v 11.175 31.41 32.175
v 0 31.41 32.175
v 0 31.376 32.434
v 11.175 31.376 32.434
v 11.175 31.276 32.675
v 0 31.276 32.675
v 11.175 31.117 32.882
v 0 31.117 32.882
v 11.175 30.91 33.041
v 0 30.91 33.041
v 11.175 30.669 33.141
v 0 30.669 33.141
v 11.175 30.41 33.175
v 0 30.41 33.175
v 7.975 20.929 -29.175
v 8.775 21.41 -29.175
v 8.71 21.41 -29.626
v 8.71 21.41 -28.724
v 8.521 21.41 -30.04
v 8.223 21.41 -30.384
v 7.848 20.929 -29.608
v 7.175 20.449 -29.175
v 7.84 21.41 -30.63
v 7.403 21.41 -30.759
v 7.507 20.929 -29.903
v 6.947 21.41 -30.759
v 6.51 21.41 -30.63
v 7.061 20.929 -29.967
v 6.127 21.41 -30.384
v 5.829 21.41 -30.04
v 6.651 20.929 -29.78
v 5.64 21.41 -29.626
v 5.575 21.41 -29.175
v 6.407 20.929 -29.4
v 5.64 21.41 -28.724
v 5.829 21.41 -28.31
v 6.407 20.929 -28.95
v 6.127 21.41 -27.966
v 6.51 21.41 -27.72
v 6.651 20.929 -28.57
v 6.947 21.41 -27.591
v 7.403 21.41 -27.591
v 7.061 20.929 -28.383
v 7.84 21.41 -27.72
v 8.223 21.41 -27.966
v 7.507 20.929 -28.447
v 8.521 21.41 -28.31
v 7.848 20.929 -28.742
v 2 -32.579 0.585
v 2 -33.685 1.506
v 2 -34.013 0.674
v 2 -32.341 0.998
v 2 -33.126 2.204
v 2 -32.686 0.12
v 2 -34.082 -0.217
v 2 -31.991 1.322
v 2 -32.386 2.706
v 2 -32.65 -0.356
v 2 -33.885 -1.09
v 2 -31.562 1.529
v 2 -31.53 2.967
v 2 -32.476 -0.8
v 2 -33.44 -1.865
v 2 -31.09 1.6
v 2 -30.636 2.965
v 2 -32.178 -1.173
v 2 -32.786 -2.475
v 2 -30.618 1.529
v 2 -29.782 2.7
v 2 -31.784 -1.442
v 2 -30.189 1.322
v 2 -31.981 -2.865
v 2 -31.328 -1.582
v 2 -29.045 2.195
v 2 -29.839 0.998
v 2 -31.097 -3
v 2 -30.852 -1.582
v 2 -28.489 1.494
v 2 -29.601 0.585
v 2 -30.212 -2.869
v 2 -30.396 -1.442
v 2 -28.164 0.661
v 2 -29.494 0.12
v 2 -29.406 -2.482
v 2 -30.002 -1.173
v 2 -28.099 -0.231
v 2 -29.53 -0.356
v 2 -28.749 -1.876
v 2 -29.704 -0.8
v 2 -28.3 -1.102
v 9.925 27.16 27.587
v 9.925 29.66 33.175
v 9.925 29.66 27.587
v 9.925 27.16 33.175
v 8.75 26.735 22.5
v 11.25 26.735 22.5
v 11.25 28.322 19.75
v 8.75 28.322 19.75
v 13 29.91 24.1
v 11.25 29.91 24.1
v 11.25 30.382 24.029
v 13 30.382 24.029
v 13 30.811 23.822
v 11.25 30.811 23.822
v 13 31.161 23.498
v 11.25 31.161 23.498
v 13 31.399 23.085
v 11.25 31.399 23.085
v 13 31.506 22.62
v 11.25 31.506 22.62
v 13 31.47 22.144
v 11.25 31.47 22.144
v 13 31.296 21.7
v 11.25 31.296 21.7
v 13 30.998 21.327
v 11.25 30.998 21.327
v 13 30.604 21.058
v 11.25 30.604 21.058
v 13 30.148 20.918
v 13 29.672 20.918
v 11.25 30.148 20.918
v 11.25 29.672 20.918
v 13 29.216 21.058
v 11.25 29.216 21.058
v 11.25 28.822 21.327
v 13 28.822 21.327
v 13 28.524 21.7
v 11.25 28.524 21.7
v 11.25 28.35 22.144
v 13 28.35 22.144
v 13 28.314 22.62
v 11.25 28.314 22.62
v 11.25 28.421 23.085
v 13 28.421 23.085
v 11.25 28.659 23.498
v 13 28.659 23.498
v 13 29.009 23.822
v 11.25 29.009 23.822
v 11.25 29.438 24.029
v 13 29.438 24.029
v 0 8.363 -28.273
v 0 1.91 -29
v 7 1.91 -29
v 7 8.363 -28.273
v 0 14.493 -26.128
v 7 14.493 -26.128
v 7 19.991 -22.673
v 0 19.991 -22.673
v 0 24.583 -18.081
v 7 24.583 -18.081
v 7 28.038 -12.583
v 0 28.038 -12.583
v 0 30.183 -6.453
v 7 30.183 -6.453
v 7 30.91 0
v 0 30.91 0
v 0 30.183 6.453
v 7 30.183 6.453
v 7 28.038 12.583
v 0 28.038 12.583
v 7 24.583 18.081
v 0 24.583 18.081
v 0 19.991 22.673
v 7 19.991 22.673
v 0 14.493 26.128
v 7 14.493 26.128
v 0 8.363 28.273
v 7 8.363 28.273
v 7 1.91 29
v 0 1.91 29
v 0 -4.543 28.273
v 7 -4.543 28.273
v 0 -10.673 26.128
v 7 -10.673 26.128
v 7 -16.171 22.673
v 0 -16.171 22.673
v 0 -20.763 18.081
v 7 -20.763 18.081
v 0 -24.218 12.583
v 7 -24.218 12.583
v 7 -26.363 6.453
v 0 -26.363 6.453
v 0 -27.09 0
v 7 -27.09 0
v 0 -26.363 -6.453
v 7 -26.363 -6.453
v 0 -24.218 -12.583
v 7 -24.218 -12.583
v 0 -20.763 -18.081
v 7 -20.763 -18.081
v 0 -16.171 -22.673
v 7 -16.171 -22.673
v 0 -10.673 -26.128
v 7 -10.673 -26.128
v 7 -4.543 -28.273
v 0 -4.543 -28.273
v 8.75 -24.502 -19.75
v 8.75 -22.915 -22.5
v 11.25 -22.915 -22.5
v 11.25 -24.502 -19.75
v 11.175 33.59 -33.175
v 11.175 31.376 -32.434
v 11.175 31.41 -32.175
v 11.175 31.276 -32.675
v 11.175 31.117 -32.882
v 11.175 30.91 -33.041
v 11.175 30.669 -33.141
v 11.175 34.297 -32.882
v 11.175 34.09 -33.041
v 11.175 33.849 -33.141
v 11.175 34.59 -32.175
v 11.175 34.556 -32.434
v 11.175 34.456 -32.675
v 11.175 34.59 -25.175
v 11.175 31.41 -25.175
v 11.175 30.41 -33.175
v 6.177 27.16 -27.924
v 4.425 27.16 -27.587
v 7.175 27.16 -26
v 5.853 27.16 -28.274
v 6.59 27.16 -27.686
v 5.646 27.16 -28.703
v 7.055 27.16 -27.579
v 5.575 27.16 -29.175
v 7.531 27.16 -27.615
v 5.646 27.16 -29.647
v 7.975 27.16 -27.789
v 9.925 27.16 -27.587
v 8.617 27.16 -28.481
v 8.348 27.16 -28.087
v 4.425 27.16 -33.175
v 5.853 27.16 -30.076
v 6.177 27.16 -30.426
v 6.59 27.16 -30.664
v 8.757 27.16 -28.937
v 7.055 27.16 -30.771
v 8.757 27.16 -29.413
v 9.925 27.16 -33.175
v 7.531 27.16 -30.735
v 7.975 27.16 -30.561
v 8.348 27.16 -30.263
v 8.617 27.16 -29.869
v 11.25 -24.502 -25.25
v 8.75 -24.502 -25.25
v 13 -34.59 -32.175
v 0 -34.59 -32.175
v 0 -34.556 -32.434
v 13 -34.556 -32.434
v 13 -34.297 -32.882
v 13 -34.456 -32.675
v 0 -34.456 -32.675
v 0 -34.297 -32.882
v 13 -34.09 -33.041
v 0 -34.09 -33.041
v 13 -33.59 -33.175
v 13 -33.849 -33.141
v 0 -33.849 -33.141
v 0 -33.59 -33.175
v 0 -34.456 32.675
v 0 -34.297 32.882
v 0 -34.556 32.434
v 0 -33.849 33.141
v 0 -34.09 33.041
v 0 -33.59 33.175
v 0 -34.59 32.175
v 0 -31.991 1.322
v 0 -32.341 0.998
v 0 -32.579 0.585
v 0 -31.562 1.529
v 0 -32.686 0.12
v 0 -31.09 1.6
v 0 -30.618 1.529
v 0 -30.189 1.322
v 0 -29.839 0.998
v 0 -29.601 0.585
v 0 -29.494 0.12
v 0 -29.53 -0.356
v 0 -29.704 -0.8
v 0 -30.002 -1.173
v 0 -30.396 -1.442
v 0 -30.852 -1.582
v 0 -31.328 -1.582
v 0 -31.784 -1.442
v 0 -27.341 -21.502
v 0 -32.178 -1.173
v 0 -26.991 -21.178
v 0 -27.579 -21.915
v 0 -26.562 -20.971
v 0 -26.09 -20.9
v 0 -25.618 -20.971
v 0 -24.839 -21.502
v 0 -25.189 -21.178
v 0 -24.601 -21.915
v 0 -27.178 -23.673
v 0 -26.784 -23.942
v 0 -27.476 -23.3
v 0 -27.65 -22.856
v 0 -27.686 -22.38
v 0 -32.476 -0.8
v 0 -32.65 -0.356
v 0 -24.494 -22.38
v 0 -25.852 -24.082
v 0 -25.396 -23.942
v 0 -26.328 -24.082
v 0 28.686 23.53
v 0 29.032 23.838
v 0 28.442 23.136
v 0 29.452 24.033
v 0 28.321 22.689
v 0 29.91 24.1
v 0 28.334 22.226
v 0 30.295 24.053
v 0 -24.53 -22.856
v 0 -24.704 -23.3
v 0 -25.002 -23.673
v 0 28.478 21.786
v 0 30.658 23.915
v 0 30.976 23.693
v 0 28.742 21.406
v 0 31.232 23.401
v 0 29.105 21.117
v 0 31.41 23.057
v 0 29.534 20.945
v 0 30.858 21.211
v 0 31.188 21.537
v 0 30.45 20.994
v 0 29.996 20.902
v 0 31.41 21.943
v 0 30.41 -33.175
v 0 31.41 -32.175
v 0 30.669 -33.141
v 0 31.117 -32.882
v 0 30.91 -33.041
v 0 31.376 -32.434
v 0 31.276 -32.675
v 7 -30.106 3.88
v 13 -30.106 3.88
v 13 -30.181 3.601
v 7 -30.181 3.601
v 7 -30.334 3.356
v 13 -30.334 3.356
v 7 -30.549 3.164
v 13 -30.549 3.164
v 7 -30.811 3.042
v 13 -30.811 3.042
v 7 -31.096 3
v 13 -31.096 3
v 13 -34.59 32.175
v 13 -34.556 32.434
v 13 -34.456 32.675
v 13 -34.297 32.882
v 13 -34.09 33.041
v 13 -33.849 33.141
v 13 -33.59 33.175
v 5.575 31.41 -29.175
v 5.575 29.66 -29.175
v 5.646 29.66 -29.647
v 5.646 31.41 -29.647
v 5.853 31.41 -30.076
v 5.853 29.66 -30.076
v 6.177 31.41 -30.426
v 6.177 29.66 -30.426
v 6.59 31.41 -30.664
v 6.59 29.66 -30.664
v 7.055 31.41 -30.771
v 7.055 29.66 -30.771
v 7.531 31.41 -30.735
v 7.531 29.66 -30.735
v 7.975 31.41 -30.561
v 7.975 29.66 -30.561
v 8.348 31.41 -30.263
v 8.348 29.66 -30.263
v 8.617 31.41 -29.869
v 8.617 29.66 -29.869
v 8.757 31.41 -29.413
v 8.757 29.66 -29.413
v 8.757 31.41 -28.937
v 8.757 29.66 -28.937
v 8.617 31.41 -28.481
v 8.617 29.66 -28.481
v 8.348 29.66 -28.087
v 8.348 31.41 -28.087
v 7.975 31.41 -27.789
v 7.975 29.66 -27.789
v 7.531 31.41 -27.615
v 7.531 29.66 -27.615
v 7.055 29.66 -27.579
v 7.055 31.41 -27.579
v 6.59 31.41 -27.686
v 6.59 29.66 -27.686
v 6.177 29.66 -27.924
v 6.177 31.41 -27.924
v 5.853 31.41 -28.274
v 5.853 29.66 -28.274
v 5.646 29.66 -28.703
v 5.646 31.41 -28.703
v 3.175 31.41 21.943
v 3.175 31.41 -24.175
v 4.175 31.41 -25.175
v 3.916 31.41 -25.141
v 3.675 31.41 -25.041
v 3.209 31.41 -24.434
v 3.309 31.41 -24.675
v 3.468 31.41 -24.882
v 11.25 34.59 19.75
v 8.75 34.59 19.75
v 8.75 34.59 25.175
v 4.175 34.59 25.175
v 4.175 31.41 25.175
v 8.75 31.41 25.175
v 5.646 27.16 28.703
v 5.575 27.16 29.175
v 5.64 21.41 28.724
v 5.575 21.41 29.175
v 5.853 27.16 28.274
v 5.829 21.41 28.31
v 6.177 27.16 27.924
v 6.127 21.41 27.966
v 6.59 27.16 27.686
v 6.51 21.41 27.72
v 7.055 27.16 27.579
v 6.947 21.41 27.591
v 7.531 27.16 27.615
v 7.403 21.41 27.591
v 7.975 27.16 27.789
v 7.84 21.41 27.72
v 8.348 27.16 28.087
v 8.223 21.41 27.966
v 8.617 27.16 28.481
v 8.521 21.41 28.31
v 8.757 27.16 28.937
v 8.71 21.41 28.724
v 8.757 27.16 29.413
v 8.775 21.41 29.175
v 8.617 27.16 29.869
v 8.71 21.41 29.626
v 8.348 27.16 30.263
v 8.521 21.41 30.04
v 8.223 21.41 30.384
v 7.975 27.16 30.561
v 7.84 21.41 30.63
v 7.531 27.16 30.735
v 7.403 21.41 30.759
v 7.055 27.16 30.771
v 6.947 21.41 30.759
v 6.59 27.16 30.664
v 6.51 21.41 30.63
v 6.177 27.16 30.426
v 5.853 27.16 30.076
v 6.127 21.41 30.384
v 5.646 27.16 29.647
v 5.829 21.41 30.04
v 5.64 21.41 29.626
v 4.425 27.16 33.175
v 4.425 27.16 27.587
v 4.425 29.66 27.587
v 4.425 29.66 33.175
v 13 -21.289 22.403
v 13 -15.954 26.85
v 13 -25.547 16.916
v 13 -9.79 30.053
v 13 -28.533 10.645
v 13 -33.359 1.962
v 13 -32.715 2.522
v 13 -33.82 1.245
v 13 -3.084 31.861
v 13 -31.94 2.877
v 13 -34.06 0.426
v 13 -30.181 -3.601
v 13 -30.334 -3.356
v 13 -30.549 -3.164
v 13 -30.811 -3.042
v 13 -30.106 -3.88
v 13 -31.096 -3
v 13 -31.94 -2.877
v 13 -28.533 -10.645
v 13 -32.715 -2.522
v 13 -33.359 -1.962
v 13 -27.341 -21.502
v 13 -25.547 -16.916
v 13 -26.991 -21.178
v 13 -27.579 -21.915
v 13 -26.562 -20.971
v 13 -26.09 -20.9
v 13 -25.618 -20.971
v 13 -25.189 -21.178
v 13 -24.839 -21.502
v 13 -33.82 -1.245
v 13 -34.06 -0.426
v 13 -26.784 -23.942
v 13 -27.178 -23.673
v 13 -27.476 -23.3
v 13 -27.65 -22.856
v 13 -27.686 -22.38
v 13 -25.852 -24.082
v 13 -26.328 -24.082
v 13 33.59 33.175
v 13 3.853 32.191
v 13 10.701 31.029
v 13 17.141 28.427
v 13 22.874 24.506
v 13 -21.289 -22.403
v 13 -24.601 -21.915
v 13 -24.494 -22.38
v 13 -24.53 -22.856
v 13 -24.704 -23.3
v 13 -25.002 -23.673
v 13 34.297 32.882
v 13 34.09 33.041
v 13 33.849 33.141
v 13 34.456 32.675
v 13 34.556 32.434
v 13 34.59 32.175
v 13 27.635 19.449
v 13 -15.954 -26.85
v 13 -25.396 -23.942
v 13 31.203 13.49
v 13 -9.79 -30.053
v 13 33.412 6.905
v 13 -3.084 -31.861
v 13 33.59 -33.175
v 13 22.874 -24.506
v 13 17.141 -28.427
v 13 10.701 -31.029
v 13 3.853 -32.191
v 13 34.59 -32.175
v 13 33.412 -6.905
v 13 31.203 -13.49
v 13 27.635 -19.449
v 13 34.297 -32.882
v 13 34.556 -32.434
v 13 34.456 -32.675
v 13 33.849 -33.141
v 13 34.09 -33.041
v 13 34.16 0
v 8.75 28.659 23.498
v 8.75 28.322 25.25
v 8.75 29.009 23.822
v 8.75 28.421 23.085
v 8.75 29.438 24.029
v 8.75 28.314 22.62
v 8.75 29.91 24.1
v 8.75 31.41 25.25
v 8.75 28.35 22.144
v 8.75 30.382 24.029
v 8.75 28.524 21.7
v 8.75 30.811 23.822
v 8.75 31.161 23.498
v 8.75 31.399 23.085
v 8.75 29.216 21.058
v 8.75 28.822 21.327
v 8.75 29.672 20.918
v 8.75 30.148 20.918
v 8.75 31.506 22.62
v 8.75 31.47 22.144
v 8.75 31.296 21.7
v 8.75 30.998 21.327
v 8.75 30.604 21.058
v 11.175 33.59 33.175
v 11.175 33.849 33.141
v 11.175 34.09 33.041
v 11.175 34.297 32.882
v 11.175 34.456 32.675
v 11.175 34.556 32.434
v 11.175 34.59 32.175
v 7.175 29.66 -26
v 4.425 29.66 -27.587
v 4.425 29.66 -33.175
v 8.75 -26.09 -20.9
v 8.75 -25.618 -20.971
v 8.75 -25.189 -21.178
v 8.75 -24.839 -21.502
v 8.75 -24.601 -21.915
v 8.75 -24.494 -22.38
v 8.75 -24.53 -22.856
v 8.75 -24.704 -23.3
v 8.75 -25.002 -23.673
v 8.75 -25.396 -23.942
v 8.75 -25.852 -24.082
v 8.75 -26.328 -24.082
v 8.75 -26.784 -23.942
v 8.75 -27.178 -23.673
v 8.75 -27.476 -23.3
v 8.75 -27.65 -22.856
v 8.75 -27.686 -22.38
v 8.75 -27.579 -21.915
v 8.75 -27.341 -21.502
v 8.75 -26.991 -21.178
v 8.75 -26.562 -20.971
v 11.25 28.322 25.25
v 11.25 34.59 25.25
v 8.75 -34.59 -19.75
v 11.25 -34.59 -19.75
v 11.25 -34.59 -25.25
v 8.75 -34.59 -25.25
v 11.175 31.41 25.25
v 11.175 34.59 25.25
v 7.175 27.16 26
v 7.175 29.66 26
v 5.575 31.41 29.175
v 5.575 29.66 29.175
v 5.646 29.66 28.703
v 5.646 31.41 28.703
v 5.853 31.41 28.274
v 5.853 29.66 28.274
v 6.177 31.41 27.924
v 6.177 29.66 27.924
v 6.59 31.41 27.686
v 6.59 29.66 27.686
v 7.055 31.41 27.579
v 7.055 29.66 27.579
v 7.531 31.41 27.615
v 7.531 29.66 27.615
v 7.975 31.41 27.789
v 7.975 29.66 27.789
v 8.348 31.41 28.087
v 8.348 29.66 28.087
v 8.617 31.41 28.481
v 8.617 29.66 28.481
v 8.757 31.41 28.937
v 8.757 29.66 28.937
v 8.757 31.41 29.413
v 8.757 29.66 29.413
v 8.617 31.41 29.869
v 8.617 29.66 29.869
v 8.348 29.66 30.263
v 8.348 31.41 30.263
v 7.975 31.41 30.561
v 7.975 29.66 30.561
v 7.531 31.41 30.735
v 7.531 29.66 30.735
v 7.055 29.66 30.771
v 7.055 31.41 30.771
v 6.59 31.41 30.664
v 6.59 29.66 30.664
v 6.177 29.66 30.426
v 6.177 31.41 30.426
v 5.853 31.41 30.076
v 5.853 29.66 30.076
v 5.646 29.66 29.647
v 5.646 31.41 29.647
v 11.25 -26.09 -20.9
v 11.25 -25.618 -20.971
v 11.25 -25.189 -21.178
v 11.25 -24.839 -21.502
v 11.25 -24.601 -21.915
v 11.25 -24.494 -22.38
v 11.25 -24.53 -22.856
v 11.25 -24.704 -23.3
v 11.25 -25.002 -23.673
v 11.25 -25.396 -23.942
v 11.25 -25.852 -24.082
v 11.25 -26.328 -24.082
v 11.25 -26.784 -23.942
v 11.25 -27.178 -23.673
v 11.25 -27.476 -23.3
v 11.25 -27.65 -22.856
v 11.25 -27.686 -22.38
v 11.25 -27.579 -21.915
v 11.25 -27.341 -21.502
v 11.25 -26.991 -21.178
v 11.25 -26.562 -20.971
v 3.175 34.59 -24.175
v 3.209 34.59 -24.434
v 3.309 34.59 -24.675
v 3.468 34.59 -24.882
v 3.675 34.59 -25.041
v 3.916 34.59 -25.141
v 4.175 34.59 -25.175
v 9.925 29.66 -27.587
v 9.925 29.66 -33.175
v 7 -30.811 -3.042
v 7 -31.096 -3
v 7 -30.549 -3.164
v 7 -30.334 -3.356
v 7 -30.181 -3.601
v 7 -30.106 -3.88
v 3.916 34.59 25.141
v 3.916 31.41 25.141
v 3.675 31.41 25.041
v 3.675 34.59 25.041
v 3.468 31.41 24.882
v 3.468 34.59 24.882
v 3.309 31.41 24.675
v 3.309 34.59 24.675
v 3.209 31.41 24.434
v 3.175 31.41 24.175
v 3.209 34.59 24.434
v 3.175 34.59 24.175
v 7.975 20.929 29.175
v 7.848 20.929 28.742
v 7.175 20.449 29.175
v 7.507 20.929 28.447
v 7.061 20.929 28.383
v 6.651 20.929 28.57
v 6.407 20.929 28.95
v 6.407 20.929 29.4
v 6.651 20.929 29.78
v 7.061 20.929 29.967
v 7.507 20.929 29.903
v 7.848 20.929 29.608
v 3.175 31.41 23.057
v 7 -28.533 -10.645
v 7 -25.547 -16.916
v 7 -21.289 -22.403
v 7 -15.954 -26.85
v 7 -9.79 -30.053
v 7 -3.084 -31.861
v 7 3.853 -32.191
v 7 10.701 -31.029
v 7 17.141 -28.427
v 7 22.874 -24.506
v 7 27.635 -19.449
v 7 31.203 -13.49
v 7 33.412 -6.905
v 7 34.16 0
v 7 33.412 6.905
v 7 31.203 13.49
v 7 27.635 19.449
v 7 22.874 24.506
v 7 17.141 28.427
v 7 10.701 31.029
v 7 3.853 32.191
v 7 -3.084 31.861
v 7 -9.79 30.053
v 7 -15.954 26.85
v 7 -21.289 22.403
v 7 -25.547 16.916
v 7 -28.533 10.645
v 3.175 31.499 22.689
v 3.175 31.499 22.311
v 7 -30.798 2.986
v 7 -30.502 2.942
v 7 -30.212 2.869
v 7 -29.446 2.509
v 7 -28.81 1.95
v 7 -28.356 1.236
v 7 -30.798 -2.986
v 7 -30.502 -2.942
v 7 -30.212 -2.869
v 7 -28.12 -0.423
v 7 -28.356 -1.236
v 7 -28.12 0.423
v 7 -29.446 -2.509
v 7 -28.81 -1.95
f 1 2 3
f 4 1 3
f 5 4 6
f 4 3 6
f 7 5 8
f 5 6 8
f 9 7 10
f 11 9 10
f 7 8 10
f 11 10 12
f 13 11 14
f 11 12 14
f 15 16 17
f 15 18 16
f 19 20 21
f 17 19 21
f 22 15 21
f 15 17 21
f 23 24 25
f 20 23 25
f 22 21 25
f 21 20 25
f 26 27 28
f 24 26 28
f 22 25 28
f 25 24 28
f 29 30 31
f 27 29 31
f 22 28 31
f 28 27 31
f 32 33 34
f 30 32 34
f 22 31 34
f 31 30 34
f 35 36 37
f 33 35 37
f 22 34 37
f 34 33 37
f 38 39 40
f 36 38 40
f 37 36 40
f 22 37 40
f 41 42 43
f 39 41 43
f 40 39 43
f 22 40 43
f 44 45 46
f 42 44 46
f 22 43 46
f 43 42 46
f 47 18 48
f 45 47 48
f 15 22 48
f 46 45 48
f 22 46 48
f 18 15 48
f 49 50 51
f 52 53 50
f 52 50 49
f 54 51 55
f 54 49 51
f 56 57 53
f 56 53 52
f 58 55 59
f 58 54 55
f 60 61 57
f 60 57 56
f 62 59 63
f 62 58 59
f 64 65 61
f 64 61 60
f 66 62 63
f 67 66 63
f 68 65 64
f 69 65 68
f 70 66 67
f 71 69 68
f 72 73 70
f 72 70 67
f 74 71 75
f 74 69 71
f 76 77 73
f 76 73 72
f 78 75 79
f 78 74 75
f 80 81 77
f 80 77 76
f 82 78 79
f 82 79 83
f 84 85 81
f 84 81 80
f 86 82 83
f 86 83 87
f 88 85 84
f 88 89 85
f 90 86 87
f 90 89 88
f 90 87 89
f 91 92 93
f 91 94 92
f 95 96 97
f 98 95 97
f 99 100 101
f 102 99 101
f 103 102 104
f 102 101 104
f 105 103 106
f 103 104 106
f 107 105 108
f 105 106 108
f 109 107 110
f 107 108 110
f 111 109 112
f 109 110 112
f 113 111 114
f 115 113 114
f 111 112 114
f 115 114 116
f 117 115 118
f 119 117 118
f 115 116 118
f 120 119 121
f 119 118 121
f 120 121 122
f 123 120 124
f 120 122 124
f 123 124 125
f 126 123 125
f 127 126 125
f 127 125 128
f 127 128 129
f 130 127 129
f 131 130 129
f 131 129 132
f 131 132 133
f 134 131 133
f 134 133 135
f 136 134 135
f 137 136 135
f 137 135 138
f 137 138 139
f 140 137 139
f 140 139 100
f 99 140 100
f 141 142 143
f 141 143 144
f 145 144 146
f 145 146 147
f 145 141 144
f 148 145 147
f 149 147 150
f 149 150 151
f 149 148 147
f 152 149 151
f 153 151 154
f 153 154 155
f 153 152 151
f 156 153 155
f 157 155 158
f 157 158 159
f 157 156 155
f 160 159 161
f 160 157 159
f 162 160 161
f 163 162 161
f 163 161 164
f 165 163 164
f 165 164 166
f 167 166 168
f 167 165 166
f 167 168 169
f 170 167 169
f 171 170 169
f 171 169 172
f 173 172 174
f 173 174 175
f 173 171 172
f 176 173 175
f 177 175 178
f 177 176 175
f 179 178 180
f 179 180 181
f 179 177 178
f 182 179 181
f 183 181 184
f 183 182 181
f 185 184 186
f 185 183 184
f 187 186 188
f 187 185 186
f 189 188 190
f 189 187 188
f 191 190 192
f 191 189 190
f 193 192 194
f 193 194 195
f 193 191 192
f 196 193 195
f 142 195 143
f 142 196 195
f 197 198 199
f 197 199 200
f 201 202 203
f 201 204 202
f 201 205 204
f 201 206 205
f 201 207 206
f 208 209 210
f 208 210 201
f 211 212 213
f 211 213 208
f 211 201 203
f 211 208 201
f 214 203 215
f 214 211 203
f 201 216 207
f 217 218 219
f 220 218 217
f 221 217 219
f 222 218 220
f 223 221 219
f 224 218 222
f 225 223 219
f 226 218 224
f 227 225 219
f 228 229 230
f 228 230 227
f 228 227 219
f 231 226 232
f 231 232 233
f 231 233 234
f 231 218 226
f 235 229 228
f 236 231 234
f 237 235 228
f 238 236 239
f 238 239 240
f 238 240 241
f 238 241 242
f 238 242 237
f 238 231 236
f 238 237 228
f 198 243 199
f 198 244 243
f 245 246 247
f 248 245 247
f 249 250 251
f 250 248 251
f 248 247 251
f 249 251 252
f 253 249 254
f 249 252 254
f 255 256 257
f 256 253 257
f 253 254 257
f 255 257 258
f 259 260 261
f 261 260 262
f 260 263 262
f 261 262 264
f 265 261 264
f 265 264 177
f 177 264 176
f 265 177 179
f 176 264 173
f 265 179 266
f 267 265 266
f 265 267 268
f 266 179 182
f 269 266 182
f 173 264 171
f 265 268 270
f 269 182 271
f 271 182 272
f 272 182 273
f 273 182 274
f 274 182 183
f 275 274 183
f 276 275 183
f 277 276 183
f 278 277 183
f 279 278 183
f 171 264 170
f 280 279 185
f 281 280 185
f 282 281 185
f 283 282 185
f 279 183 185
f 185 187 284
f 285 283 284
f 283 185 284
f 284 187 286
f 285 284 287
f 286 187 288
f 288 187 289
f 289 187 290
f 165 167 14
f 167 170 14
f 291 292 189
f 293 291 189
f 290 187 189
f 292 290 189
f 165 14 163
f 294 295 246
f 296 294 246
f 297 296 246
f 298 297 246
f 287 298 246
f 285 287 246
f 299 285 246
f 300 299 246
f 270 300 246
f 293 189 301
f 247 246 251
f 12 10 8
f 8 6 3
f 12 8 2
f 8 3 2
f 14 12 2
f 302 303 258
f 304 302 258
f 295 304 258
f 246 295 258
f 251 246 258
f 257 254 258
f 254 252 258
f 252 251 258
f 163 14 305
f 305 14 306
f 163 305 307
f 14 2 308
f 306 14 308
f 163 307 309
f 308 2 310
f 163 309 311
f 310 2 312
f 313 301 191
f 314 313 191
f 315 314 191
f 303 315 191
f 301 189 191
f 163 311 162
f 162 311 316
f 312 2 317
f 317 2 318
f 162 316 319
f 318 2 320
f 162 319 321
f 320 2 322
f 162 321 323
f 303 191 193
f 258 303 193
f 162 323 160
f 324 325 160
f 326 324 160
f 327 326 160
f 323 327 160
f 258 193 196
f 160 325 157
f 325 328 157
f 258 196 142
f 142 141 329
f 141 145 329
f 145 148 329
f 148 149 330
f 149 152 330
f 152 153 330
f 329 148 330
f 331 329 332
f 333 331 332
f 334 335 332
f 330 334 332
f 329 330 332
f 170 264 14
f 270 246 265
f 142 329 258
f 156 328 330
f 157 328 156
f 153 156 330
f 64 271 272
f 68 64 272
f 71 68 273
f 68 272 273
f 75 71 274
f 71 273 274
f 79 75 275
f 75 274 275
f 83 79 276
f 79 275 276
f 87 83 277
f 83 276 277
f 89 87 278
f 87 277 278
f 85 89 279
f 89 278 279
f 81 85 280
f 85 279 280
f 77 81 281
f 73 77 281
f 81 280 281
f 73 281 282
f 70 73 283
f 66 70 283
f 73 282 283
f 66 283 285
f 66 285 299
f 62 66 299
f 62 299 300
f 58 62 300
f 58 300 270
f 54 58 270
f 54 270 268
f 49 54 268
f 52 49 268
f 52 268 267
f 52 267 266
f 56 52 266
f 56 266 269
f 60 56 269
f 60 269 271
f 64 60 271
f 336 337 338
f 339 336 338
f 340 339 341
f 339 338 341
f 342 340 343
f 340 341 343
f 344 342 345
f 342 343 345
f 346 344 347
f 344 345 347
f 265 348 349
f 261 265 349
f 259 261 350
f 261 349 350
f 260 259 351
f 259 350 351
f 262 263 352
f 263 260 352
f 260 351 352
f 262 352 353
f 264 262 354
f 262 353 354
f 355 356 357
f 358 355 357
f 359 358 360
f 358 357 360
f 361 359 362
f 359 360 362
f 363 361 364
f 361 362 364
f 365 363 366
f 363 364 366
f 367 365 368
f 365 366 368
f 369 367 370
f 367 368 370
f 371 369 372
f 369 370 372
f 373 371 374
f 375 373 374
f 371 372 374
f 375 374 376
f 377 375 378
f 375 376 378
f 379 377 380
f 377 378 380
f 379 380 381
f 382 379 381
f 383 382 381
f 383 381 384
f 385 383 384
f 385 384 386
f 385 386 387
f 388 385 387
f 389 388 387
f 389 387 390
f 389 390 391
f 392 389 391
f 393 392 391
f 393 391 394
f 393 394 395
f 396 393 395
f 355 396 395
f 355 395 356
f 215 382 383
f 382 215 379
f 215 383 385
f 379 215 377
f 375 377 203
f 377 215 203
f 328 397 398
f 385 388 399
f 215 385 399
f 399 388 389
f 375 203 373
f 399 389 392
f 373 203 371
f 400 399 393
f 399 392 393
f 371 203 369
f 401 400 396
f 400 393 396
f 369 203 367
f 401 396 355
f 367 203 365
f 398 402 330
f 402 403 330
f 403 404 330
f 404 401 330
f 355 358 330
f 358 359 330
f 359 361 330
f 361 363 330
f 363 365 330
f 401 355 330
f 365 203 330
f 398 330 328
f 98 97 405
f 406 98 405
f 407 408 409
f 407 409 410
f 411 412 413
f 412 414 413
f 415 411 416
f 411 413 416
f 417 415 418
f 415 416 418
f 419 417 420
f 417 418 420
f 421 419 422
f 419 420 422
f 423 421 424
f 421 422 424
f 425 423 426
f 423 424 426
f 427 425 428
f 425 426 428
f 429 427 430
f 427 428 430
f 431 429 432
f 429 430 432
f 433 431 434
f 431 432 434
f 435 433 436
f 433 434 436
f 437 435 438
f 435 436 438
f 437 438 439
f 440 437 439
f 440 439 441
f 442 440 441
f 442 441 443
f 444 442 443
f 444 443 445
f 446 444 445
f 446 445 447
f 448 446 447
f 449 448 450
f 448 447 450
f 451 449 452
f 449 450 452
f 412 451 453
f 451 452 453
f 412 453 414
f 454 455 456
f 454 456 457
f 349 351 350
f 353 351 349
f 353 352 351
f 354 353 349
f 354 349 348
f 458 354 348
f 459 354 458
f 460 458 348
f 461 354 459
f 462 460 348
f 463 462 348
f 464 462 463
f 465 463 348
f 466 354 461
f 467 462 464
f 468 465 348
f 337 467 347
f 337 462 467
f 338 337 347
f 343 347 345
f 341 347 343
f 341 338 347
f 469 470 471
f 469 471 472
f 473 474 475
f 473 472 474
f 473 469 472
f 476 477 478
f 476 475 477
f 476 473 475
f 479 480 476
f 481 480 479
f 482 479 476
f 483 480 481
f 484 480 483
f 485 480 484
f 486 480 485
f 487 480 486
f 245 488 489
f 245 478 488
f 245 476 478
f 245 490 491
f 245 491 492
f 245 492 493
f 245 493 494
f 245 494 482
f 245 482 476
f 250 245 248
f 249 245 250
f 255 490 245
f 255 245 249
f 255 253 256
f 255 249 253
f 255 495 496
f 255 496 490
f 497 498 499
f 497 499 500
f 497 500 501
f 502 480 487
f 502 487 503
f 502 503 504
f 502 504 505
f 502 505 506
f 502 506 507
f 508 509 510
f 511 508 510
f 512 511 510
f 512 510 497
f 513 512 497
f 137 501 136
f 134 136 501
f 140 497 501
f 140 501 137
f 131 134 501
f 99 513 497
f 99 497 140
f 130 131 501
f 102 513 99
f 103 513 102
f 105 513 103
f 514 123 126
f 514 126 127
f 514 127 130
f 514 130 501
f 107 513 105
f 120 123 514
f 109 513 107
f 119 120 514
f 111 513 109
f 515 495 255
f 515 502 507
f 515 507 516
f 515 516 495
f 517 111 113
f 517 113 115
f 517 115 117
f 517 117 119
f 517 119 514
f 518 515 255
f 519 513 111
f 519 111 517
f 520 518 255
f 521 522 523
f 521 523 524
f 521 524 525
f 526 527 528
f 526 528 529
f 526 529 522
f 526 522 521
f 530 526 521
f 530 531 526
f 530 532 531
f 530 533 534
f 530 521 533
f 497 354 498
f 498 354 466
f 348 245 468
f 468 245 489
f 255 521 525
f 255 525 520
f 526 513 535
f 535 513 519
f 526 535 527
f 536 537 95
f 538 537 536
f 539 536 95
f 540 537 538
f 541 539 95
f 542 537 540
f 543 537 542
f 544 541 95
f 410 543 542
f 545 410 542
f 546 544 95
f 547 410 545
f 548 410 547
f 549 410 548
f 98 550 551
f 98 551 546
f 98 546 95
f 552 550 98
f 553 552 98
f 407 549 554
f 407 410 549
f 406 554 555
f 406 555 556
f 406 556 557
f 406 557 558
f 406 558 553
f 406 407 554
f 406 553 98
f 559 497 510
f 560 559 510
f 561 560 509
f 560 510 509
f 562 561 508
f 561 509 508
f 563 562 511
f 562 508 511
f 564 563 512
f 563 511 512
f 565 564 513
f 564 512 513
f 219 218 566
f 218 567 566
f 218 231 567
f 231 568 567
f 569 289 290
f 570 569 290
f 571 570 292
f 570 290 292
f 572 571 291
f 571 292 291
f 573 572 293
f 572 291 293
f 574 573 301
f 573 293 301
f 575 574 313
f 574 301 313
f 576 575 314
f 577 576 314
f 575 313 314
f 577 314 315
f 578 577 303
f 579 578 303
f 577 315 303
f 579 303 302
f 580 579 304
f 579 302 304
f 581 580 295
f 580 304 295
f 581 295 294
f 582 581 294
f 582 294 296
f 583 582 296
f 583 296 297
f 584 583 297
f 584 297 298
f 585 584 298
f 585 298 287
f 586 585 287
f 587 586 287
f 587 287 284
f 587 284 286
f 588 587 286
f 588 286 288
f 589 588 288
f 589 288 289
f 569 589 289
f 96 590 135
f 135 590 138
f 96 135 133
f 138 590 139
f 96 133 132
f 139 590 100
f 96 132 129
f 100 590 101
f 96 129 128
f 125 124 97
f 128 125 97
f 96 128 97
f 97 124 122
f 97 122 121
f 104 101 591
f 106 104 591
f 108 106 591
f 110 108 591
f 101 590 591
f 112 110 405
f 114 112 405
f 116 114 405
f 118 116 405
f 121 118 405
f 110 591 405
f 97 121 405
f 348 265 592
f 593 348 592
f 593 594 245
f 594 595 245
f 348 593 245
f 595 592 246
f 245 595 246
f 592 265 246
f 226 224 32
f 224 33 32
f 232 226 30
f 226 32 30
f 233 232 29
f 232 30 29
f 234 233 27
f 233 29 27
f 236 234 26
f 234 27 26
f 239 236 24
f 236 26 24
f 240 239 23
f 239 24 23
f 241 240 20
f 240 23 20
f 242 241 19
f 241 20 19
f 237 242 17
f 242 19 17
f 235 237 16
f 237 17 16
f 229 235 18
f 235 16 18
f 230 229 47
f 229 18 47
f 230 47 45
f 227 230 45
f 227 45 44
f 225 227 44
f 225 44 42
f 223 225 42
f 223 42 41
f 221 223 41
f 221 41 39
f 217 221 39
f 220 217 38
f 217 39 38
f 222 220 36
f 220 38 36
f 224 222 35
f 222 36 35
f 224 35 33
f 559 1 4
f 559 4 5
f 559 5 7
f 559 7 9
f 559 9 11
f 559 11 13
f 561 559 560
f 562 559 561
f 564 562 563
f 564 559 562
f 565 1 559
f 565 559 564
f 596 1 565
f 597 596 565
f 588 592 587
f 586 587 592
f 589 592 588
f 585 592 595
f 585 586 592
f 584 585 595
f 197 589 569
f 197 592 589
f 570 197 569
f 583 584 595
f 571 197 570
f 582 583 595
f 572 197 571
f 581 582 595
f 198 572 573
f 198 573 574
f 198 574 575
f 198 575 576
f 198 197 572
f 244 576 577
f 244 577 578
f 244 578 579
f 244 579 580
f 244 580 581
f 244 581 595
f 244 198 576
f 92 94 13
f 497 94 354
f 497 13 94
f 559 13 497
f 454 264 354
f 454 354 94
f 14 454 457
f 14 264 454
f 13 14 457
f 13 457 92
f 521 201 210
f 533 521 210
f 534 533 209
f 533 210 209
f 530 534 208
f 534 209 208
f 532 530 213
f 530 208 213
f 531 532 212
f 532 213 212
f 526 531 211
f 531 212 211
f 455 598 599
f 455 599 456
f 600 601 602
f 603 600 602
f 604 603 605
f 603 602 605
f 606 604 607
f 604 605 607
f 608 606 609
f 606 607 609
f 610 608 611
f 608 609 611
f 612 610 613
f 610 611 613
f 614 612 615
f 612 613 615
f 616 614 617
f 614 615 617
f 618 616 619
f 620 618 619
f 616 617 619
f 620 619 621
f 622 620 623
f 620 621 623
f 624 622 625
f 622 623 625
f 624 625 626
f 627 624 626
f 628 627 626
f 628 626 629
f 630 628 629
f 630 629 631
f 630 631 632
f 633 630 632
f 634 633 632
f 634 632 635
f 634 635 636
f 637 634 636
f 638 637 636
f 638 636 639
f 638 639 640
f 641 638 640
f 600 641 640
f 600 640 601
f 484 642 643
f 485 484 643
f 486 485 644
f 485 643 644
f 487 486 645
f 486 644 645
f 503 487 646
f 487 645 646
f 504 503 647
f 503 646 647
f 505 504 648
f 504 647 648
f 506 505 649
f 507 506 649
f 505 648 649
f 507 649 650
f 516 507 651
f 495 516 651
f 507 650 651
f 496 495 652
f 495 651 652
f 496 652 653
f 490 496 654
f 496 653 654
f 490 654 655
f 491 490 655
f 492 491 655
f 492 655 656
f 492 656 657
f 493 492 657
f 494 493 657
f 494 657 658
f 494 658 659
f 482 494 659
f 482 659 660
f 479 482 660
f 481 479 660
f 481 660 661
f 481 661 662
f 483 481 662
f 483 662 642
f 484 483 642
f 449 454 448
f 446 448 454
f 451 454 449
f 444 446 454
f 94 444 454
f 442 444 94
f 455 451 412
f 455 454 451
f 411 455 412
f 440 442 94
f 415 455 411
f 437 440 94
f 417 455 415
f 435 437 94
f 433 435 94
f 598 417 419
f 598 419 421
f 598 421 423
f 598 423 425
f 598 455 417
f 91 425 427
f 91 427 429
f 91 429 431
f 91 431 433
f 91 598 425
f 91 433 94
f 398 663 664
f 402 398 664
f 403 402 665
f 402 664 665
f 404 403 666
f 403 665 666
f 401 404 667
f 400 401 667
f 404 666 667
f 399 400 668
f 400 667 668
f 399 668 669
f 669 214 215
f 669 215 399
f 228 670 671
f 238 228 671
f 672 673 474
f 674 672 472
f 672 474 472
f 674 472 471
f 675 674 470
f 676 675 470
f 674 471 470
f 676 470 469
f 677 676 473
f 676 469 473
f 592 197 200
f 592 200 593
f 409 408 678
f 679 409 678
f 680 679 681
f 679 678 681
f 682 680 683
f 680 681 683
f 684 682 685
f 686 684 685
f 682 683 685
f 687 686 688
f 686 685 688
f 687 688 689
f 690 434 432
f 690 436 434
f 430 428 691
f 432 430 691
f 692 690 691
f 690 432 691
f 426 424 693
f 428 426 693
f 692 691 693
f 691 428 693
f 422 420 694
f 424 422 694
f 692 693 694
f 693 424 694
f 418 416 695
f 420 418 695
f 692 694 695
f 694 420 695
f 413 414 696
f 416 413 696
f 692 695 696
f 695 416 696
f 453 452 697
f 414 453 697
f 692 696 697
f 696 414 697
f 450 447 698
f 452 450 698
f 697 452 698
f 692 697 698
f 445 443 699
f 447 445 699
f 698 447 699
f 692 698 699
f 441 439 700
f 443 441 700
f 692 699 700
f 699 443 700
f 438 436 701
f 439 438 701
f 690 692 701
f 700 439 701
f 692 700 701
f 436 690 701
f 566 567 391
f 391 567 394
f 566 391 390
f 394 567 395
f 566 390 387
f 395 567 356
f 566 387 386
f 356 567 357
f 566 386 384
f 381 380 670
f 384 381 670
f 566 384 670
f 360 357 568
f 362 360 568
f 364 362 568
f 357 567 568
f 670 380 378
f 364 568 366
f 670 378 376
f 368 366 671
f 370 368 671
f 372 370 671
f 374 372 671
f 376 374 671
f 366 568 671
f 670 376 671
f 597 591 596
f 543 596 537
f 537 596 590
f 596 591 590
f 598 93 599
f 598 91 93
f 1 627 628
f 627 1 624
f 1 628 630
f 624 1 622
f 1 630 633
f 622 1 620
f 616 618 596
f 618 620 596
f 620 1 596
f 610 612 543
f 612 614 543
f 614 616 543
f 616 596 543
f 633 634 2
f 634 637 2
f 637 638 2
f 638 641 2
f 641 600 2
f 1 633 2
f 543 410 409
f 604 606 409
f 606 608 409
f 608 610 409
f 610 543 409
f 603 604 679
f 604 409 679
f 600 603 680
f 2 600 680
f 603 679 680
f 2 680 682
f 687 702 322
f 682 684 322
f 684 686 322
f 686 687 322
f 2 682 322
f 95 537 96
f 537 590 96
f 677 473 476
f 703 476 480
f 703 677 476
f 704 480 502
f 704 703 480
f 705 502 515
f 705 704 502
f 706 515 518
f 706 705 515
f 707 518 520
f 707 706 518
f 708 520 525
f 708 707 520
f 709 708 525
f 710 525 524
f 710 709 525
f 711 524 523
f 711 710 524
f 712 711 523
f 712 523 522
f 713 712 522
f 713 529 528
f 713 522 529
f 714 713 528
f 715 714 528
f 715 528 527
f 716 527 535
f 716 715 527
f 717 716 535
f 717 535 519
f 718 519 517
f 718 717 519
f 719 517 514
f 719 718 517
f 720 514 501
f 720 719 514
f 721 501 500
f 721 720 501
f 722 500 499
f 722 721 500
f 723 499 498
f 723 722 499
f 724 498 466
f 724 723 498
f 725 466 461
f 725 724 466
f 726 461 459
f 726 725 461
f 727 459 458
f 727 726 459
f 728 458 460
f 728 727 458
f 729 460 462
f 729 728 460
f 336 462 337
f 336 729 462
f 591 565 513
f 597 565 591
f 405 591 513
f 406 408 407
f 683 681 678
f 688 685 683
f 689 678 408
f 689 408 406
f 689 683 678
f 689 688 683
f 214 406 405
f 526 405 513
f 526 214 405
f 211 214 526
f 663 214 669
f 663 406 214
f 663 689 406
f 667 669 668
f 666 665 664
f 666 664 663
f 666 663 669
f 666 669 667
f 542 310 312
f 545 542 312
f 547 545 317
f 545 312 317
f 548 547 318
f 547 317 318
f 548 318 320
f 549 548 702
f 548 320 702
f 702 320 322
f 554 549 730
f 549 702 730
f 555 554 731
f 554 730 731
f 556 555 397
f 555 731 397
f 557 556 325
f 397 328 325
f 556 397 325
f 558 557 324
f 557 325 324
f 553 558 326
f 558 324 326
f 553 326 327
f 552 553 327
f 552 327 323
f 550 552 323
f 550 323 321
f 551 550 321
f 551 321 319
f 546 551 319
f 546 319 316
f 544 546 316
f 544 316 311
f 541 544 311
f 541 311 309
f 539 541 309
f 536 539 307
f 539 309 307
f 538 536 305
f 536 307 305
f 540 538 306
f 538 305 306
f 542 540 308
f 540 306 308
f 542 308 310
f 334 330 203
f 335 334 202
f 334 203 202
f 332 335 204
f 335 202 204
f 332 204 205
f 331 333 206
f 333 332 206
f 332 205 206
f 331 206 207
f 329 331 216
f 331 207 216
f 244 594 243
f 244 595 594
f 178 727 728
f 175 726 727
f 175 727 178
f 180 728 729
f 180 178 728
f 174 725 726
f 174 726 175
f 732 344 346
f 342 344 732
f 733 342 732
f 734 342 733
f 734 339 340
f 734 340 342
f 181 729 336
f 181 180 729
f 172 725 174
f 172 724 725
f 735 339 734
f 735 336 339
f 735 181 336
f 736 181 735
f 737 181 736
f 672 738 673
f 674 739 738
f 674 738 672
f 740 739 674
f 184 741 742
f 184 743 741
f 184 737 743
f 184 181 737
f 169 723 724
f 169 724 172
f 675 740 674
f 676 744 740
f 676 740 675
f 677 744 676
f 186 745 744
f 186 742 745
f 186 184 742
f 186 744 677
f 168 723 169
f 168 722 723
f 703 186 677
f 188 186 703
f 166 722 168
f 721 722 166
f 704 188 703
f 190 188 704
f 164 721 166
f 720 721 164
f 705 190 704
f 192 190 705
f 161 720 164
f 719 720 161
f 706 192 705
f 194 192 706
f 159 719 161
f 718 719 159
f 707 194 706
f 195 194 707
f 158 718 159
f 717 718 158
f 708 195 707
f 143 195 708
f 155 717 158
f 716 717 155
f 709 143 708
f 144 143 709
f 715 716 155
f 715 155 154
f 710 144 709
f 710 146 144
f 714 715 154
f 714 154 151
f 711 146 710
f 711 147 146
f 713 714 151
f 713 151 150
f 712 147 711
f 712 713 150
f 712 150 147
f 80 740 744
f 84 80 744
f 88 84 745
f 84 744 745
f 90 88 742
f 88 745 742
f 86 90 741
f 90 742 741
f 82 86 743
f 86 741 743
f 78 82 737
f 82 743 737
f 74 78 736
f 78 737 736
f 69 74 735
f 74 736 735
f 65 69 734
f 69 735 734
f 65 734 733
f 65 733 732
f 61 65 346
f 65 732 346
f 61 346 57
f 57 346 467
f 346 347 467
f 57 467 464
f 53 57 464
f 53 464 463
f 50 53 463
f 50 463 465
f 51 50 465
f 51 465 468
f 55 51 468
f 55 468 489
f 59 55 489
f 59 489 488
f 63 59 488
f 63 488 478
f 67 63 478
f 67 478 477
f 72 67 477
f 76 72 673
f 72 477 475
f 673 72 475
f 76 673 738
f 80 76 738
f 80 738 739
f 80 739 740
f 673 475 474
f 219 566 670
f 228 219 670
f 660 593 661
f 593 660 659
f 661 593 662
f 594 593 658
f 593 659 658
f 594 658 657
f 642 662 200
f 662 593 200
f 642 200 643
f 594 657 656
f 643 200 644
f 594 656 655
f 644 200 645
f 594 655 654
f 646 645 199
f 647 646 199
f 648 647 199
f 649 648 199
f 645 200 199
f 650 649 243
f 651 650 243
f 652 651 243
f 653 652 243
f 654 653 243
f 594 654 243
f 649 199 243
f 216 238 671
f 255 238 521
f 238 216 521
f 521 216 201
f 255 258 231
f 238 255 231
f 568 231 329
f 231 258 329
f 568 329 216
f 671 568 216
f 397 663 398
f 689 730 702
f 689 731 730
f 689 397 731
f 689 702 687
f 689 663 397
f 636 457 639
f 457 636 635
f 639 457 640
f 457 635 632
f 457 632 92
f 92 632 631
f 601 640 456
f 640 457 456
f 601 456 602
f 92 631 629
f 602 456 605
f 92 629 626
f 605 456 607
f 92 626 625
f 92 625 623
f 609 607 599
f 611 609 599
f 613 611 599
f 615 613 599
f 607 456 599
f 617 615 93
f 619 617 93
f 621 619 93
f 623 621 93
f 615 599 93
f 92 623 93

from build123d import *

# Parameters (mm, degrees)
SKETCH1_W                = 66.35
SKETCH1_H                = 69.18
SKETCH1_R                = 29
BOSS_EXTRUDE1_DEPTH      = 7
SKETCH3_W                = 66.35
SKETCH3_H                = 69.18
SKETCH3_R                = 32.25
BOSS_EXTRUDE2_DEPTH      = 6
CUT_EXTRUDE1_DEPTH       = 3.18
CUT_EXTRUDE5_DEPTH       = 1.25
M3_CLEARANCE_HOLE3_D     = 3.2
M3_CLEARANCE_HOLE3_DEPTH = 10
M3_CLEARANCE_HOLE3_TIP   = 0.96137699
SKETCH14_R               = 3
CUT_EXTRUDE3_DEPTH       = 11
CUT_EXTRUDE4_DEPTH       = 1.25
M3_CLEARANCE_HOLE2_D     = 3.2
FILLET1_R                = 1


with BuildPart() as part:
    # Sketch1 → Boss-Extrude1 (new body)
    with BuildSketch(Plane(origin=(0, 0, 0), x_dir=(0, 0, -1), z_dir=(1, 0, 0))):
        Rectangle(SKETCH1_W, SKETCH1_H)
        with Locations((0, 1.91)):
            Circle(SKETCH1_R, mode=Mode.SUBTRACT)
    extrude(amount=BOSS_EXTRUDE1_DEPTH)

    # Sketch3 → Boss-Extrude2 (add)
    with BuildSketch(Plane(origin=(7, 0, 0), x_dir=(0, 0, -1), z_dir=(1, 0, 0))):
        Rectangle(SKETCH3_W, SKETCH3_H)
        with Locations((0, 1.91)):
            Circle(SKETCH3_R, mode=Mode.SUBTRACT)
    extrude(amount=BOSS_EXTRUDE2_DEPTH)

    # Sketch5 → Cut-Extrude1 (cut)
    with BuildSketch(Plane(origin=(0, 34.59, 0), x_dir=(1, 0, 0), z_dir=(0, 1, 0))):
        Polygon((3.175, 33.175), (11.175, 33.175), (11.175, 25.175), (3.175, 25.175), (3.175, -25.175), (11.175, -25.175), (11.175, -33.175), (3.175, -33.175), (0, -33.175), (0, 33.175), align=None)
    extrude(amount=-CUT_EXTRUDE1_DEPTH, mode=Mode.SUBTRACT)

    # Sketch8 → Cut-Extrude5 (cut, symmetric)
    with BuildSketch(Plane(origin=(0, 28.41, 0), x_dir=(1, 0, 0), z_dir=(0, 1, 0))):
        Polygon((4.425, -30.76271324), (4.425, -33.175), (9.925, -33.175), (9.925, -30.76271324), (9.925, -27.58728676), (7.175, -25.999573519), (4.425, -27.58728676), align=None)
        Polygon((4.425, 30.76271324), (4.425, 27.58728676), (7.175, 25.999573519), (9.925, 27.58728676), (9.925, 30.76271324), (9.925, 33.175), (4.425, 33.175), align=None)
    extrude(amount=CUT_EXTRUDE5_DEPTH, both=True, mode=Mode.SUBTRACT)

    # M3 Clearance Hole3
    with Locations(Plane(origin=(0, 31.41, 0), x_dir=(1, 0, 0), z_dir=(0, 1, 0))):
        with Locations((7.175, 29.175), (7.175, -29.175)):
            Hole(M3_CLEARANCE_HOLE3_D / 2, depth=M3_CLEARANCE_HOLE3_DEPTH)
            with Locations((0, 0, -(M3_CLEARANCE_HOLE3_DEPTH + M3_CLEARANCE_HOLE3_TIP / 2))):  # 118° drill point
                Cone(0, M3_CLEARANCE_HOLE3_D / 2, M3_CLEARANCE_HOLE3_TIP, mode=Mode.SUBTRACT)

    # Sketch14 → Cut-Extrude3 (cut)
    with BuildSketch(Plane(origin=(13, 0, 0), x_dir=(0, 0, -1), z_dir=(1, 0, 0))):
        with Locations(Location((0, -31.09, 0), (0, 0, 17.014495586))):
            Circle(SKETCH14_R)
    extrude(amount=-CUT_EXTRUDE3_DEPTH, mode=Mode.SUBTRACT)

    # Sketch15 → Cut-Extrude4 (cut, symmetric)
    with BuildSketch(Plane(origin=(10, 0, 0), x_dir=(0, 0, -1), z_dir=(1, 0, 0))):
        Polygon((19.75, -27.67771324), (19.75, -34.59), (25.25, -34.59), (25.25, -27.67771324), (25.25, -24.50228676), (22.5, -22.914573519), (19.75, -24.50228676), align=None)
        Polygon((-25.25, 31.49771324), (-25.25, 28.32228676), (-22.5, 26.734573519), (-19.75, 28.32228676), (-19.75, 31.49771324), (-19.75, 34.59), (-25.25, 34.59), align=None)
    extrude(amount=CUT_EXTRUDE4_DEPTH, both=True, mode=Mode.SUBTRACT)

    # M3 Clearance Hole2 (through all)
    with Locations(Plane(origin=(13, 0, 0), x_dir=(0, 0, -1), z_dir=(1, 0, 0))):
        with Locations((0, -31.09), (-22.5, 29.91), (22.5, -26.09)):
            Hole(M3_CLEARANCE_HOLE2_D / 2)

    # Fillet1
    # the kernel refuses this fillet: 1 mm, written as the material it takes off along each edge
    with BuildSketch(Plane(origin=(15.541447309, -30.212159091, -2.86869227), x_dir=(0, 0.10463908586340893, -0.9945102622445231), z_dir=(-1, 0, 0))) as fillet1_piece_1:
        with BuildLine():
            CenterArc((1.032339837, 0.999875789), FILLET1_R, 186.128452326, 82.968476456)
            ThreePointArc((0.038054785, 0.893117956), (0.052480052, 0.445133596), (0, 0))
            ThreePointArc((0, 0), (0.508289462, 0.004005802), (1.016578924, 0))
        make_face()
    extrude(amount=8.541447309, mode=Mode.SUBTRACT)
    with BuildSketch(Plane(origin=(15.541447309, -30.212159091, 2.86869227), x_dir=(0, 0.10463908586340893, 0.9945102622445231), z_dir=(-1, 0, 0))) as fillet1_piece_2:
        with BuildLine():
            CenterArc((1.032339837, -0.999875789), FILLET1_R, 90.903071218, 82.968476456)
            ThreePointArc((0.038054785, -0.893117956), (0.052480052, -0.445133596), (0, 0))
            ThreePointArc((0, 0), (0.508289462, -0.004005802), (1.016578924, 0))
        make_face()
    extrude(amount=8.541447309, mode=Mode.SUBTRACT)
    with BuildSketch(Plane(origin=(3.175, 37.09, -25.175), x_dir=(1, 0, 0), z_dir=(0, -1, 0)), Plane(origin=(3.175, 37.09, 25.175), x_dir=(0, 0, -1), z_dir=(0, -1, 0))) as fillet1_piece_3:
        with BuildLine():
            CenterArc((FILLET1_R, FILLET1_R), FILLET1_R, 180, 90)
            Line((0, FILLET1_R), (0, 0))
            Line((0, 0), (FILLET1_R, 0))
        make_face()
    extrude(amount=5.68, mode=Mode.SUBTRACT)
    with BuildSketch(Plane(origin=(11.175, 31.41, -33.175), x_dir=(0, -1, 0), z_dir=(-1, 0, 0)), Plane(origin=(-2.5, 31.41, 33.175), x_dir=(0, -1, 0), z_dir=(1, 0, 0))) as fillet1_piece_4:
        with BuildLine():
            CenterArc((FILLET1_R, FILLET1_R), FILLET1_R, 180, 90)
            Line((0, FILLET1_R), (0, 0))
            Line((0, 0), (FILLET1_R, 0))
        make_face()
    extrude(amount=13.675, mode=Mode.SUBTRACT)
    with BuildSketch(Plane(origin=(-2.5, -34.59, -33.175), x_dir=(0, 0, 1), z_dir=(1, 0, 0)), Plane(origin=(15.5, -34.59, 33.175), x_dir=(0, 0, -1), z_dir=(-1, 0, 0))) as fillet1_piece_5:
        with BuildLine():
            CenterArc((FILLET1_R, -FILLET1_R), FILLET1_R, 90, 90)
            Line((0, -FILLET1_R), (0, 0))
            Line((0, 0), (FILLET1_R, 0))
        make_face()
    extrude(amount=18, mode=Mode.SUBTRACT)
    with BuildSketch(Plane(origin=(15.5, 34.59, 33.175), x_dir=(0, -1, 0), z_dir=(-1, 0, 0)), Plane(origin=(8.675, 34.59, -33.175), x_dir=(0, -1, 0), z_dir=(1, 0, 0))) as fillet1_piece_6:
        with BuildLine():
            CenterArc((FILLET1_R, -FILLET1_R), FILLET1_R, 90, 90)
            Line((0, -FILLET1_R), (0, 0))
            Line((0, 0), (FILLET1_R, 0))
        make_face()
    extrude(amount=6.825, mode=Mode.SUBTRACT)


solid = part.part
